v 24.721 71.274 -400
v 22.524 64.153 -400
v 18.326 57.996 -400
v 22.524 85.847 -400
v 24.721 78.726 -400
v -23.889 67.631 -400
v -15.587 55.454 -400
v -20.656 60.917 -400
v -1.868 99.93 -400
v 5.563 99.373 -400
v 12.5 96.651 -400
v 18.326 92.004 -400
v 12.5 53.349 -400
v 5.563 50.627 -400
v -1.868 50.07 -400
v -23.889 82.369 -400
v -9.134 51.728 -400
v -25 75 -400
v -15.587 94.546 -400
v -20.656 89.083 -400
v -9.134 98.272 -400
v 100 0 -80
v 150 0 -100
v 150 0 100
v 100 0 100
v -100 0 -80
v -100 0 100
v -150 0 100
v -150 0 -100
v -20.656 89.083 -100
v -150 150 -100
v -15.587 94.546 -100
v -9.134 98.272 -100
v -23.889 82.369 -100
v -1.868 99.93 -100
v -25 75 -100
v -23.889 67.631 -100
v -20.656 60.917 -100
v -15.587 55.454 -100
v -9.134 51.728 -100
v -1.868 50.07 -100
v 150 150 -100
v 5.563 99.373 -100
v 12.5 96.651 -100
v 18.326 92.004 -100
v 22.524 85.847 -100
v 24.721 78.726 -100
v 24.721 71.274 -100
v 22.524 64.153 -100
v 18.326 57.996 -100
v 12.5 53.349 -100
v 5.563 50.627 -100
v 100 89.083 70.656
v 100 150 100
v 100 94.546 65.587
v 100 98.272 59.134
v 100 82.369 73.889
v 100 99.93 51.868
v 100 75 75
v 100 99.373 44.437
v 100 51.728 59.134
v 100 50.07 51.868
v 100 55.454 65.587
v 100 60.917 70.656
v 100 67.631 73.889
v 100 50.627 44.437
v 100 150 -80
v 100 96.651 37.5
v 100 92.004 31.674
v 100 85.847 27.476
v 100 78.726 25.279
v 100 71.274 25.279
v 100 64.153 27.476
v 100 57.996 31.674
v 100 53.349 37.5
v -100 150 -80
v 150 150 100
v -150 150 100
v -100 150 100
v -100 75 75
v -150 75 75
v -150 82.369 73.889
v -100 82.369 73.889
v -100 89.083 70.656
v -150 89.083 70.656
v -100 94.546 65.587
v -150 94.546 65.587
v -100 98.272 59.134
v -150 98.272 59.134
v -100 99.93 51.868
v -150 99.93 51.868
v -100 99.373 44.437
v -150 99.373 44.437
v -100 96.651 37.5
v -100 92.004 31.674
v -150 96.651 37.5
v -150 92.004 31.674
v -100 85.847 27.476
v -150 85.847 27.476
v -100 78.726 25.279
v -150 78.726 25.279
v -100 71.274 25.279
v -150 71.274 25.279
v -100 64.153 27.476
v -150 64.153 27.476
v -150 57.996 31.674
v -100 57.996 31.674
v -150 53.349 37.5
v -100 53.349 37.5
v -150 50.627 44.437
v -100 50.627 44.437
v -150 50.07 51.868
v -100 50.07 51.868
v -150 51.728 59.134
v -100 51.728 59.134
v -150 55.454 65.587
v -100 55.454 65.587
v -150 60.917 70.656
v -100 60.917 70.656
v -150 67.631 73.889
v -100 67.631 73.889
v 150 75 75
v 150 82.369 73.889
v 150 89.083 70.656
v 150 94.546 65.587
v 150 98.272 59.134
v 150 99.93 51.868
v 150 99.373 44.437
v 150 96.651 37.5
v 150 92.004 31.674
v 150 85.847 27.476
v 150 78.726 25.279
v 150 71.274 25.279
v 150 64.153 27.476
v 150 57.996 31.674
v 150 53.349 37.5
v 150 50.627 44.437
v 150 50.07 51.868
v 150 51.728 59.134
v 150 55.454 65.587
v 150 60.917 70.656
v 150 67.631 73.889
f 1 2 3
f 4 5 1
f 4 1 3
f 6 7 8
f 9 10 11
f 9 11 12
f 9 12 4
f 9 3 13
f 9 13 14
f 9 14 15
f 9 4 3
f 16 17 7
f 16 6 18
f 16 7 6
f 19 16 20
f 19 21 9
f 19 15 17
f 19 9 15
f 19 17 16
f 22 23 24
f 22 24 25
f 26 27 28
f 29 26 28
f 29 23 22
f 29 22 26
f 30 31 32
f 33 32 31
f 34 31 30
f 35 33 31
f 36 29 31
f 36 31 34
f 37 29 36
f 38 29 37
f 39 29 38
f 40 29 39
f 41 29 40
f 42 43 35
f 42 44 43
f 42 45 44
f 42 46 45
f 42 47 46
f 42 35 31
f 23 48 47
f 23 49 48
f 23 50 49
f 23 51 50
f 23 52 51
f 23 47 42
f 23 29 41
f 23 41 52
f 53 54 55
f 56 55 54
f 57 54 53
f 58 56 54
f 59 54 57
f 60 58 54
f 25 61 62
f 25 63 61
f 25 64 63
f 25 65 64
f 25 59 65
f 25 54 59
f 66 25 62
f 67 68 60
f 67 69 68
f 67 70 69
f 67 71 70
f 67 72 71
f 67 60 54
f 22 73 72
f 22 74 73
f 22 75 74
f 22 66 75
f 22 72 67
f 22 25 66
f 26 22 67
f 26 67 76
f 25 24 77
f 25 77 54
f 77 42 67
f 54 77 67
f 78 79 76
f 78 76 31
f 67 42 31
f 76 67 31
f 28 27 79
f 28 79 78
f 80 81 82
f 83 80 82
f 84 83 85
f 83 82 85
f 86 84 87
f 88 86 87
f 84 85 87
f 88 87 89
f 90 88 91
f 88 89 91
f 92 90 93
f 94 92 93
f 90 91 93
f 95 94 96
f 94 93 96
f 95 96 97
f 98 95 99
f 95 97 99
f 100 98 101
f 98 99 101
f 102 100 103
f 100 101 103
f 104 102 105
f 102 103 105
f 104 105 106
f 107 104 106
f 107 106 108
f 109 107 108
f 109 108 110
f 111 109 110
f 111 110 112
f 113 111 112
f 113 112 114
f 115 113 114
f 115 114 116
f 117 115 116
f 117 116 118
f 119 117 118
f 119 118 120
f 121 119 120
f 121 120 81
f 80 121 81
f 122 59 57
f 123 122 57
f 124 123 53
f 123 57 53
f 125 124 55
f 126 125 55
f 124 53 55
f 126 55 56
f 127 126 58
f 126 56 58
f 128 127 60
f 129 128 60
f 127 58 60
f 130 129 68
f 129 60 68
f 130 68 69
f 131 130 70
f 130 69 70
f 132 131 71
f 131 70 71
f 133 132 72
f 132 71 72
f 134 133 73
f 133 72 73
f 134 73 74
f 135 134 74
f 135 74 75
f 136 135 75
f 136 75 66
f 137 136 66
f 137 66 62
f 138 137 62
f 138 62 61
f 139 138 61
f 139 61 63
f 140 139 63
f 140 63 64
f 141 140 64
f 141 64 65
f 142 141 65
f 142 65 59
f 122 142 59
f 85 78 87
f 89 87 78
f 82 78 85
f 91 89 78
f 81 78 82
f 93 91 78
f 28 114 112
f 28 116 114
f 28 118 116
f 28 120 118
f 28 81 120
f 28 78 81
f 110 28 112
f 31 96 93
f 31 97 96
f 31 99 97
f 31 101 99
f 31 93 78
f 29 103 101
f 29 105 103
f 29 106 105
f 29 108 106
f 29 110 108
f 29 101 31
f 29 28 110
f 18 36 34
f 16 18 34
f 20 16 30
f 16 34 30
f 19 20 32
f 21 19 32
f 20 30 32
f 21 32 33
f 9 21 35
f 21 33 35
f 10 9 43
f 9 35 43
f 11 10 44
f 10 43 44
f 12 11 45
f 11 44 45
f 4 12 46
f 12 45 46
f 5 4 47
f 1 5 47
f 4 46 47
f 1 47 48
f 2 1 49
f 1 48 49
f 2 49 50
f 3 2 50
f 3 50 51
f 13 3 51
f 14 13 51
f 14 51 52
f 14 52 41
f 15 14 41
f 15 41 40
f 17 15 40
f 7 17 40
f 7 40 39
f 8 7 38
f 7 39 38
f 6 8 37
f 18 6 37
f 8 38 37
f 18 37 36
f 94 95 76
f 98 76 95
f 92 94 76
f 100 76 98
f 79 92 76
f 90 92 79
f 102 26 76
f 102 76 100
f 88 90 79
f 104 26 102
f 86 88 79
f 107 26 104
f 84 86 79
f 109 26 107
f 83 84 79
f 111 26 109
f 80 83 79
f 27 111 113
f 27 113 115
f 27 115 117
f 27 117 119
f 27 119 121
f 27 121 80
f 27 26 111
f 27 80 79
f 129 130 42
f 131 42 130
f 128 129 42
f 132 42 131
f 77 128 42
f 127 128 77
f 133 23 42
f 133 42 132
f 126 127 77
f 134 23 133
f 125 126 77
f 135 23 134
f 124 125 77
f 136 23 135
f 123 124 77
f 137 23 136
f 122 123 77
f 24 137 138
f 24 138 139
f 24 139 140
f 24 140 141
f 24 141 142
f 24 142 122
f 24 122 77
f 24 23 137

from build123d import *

# Parameters (mm, degrees)
EXTRUDE_1_DEPTH     = 150
SKETCH_2_R          = 25
EXTRUDE_2_DEPTH     = 300
SKETCH_3_R          = 25
CUT_EXTRUDE_1_DEPTH = 300


with BuildPart() as part:
    # 스케치1 → 보스-돌출1 (new body)
    with BuildSketch(Plane(origin=(0, 0, 0), x_dir=(1, 0, 0), z_dir=(0, 1, 0))):
        Polygon((-100, -100), (-150, -100), (-150, 100), (150, 100), (150, -100), (100, -100), (100, 80), (-100, 80), align=None)
    extrude(amount=EXTRUDE_1_DEPTH)

    # 스케치2 → 보스-돌출2 (add)
    with BuildSketch(Plane(origin=(0, 0, -100), x_dir=(-1, 0, 0), z_dir=(0, 0, -1))):
        with Locations((0, 75)):
            Circle(SKETCH_2_R)
    extrude(amount=EXTRUDE_2_DEPTH)

    # 스케치3 → 컷-돌출1 (cut)
    with BuildSketch(Plane.ZY.offset(150)):
        with Locations((50, 75)):
            Circle(SKETCH_3_R)
    extrude(amount=-CUT_EXTRUDE_1_DEPTH, mode=Mode.SUBTRACT)


solid = part.part
